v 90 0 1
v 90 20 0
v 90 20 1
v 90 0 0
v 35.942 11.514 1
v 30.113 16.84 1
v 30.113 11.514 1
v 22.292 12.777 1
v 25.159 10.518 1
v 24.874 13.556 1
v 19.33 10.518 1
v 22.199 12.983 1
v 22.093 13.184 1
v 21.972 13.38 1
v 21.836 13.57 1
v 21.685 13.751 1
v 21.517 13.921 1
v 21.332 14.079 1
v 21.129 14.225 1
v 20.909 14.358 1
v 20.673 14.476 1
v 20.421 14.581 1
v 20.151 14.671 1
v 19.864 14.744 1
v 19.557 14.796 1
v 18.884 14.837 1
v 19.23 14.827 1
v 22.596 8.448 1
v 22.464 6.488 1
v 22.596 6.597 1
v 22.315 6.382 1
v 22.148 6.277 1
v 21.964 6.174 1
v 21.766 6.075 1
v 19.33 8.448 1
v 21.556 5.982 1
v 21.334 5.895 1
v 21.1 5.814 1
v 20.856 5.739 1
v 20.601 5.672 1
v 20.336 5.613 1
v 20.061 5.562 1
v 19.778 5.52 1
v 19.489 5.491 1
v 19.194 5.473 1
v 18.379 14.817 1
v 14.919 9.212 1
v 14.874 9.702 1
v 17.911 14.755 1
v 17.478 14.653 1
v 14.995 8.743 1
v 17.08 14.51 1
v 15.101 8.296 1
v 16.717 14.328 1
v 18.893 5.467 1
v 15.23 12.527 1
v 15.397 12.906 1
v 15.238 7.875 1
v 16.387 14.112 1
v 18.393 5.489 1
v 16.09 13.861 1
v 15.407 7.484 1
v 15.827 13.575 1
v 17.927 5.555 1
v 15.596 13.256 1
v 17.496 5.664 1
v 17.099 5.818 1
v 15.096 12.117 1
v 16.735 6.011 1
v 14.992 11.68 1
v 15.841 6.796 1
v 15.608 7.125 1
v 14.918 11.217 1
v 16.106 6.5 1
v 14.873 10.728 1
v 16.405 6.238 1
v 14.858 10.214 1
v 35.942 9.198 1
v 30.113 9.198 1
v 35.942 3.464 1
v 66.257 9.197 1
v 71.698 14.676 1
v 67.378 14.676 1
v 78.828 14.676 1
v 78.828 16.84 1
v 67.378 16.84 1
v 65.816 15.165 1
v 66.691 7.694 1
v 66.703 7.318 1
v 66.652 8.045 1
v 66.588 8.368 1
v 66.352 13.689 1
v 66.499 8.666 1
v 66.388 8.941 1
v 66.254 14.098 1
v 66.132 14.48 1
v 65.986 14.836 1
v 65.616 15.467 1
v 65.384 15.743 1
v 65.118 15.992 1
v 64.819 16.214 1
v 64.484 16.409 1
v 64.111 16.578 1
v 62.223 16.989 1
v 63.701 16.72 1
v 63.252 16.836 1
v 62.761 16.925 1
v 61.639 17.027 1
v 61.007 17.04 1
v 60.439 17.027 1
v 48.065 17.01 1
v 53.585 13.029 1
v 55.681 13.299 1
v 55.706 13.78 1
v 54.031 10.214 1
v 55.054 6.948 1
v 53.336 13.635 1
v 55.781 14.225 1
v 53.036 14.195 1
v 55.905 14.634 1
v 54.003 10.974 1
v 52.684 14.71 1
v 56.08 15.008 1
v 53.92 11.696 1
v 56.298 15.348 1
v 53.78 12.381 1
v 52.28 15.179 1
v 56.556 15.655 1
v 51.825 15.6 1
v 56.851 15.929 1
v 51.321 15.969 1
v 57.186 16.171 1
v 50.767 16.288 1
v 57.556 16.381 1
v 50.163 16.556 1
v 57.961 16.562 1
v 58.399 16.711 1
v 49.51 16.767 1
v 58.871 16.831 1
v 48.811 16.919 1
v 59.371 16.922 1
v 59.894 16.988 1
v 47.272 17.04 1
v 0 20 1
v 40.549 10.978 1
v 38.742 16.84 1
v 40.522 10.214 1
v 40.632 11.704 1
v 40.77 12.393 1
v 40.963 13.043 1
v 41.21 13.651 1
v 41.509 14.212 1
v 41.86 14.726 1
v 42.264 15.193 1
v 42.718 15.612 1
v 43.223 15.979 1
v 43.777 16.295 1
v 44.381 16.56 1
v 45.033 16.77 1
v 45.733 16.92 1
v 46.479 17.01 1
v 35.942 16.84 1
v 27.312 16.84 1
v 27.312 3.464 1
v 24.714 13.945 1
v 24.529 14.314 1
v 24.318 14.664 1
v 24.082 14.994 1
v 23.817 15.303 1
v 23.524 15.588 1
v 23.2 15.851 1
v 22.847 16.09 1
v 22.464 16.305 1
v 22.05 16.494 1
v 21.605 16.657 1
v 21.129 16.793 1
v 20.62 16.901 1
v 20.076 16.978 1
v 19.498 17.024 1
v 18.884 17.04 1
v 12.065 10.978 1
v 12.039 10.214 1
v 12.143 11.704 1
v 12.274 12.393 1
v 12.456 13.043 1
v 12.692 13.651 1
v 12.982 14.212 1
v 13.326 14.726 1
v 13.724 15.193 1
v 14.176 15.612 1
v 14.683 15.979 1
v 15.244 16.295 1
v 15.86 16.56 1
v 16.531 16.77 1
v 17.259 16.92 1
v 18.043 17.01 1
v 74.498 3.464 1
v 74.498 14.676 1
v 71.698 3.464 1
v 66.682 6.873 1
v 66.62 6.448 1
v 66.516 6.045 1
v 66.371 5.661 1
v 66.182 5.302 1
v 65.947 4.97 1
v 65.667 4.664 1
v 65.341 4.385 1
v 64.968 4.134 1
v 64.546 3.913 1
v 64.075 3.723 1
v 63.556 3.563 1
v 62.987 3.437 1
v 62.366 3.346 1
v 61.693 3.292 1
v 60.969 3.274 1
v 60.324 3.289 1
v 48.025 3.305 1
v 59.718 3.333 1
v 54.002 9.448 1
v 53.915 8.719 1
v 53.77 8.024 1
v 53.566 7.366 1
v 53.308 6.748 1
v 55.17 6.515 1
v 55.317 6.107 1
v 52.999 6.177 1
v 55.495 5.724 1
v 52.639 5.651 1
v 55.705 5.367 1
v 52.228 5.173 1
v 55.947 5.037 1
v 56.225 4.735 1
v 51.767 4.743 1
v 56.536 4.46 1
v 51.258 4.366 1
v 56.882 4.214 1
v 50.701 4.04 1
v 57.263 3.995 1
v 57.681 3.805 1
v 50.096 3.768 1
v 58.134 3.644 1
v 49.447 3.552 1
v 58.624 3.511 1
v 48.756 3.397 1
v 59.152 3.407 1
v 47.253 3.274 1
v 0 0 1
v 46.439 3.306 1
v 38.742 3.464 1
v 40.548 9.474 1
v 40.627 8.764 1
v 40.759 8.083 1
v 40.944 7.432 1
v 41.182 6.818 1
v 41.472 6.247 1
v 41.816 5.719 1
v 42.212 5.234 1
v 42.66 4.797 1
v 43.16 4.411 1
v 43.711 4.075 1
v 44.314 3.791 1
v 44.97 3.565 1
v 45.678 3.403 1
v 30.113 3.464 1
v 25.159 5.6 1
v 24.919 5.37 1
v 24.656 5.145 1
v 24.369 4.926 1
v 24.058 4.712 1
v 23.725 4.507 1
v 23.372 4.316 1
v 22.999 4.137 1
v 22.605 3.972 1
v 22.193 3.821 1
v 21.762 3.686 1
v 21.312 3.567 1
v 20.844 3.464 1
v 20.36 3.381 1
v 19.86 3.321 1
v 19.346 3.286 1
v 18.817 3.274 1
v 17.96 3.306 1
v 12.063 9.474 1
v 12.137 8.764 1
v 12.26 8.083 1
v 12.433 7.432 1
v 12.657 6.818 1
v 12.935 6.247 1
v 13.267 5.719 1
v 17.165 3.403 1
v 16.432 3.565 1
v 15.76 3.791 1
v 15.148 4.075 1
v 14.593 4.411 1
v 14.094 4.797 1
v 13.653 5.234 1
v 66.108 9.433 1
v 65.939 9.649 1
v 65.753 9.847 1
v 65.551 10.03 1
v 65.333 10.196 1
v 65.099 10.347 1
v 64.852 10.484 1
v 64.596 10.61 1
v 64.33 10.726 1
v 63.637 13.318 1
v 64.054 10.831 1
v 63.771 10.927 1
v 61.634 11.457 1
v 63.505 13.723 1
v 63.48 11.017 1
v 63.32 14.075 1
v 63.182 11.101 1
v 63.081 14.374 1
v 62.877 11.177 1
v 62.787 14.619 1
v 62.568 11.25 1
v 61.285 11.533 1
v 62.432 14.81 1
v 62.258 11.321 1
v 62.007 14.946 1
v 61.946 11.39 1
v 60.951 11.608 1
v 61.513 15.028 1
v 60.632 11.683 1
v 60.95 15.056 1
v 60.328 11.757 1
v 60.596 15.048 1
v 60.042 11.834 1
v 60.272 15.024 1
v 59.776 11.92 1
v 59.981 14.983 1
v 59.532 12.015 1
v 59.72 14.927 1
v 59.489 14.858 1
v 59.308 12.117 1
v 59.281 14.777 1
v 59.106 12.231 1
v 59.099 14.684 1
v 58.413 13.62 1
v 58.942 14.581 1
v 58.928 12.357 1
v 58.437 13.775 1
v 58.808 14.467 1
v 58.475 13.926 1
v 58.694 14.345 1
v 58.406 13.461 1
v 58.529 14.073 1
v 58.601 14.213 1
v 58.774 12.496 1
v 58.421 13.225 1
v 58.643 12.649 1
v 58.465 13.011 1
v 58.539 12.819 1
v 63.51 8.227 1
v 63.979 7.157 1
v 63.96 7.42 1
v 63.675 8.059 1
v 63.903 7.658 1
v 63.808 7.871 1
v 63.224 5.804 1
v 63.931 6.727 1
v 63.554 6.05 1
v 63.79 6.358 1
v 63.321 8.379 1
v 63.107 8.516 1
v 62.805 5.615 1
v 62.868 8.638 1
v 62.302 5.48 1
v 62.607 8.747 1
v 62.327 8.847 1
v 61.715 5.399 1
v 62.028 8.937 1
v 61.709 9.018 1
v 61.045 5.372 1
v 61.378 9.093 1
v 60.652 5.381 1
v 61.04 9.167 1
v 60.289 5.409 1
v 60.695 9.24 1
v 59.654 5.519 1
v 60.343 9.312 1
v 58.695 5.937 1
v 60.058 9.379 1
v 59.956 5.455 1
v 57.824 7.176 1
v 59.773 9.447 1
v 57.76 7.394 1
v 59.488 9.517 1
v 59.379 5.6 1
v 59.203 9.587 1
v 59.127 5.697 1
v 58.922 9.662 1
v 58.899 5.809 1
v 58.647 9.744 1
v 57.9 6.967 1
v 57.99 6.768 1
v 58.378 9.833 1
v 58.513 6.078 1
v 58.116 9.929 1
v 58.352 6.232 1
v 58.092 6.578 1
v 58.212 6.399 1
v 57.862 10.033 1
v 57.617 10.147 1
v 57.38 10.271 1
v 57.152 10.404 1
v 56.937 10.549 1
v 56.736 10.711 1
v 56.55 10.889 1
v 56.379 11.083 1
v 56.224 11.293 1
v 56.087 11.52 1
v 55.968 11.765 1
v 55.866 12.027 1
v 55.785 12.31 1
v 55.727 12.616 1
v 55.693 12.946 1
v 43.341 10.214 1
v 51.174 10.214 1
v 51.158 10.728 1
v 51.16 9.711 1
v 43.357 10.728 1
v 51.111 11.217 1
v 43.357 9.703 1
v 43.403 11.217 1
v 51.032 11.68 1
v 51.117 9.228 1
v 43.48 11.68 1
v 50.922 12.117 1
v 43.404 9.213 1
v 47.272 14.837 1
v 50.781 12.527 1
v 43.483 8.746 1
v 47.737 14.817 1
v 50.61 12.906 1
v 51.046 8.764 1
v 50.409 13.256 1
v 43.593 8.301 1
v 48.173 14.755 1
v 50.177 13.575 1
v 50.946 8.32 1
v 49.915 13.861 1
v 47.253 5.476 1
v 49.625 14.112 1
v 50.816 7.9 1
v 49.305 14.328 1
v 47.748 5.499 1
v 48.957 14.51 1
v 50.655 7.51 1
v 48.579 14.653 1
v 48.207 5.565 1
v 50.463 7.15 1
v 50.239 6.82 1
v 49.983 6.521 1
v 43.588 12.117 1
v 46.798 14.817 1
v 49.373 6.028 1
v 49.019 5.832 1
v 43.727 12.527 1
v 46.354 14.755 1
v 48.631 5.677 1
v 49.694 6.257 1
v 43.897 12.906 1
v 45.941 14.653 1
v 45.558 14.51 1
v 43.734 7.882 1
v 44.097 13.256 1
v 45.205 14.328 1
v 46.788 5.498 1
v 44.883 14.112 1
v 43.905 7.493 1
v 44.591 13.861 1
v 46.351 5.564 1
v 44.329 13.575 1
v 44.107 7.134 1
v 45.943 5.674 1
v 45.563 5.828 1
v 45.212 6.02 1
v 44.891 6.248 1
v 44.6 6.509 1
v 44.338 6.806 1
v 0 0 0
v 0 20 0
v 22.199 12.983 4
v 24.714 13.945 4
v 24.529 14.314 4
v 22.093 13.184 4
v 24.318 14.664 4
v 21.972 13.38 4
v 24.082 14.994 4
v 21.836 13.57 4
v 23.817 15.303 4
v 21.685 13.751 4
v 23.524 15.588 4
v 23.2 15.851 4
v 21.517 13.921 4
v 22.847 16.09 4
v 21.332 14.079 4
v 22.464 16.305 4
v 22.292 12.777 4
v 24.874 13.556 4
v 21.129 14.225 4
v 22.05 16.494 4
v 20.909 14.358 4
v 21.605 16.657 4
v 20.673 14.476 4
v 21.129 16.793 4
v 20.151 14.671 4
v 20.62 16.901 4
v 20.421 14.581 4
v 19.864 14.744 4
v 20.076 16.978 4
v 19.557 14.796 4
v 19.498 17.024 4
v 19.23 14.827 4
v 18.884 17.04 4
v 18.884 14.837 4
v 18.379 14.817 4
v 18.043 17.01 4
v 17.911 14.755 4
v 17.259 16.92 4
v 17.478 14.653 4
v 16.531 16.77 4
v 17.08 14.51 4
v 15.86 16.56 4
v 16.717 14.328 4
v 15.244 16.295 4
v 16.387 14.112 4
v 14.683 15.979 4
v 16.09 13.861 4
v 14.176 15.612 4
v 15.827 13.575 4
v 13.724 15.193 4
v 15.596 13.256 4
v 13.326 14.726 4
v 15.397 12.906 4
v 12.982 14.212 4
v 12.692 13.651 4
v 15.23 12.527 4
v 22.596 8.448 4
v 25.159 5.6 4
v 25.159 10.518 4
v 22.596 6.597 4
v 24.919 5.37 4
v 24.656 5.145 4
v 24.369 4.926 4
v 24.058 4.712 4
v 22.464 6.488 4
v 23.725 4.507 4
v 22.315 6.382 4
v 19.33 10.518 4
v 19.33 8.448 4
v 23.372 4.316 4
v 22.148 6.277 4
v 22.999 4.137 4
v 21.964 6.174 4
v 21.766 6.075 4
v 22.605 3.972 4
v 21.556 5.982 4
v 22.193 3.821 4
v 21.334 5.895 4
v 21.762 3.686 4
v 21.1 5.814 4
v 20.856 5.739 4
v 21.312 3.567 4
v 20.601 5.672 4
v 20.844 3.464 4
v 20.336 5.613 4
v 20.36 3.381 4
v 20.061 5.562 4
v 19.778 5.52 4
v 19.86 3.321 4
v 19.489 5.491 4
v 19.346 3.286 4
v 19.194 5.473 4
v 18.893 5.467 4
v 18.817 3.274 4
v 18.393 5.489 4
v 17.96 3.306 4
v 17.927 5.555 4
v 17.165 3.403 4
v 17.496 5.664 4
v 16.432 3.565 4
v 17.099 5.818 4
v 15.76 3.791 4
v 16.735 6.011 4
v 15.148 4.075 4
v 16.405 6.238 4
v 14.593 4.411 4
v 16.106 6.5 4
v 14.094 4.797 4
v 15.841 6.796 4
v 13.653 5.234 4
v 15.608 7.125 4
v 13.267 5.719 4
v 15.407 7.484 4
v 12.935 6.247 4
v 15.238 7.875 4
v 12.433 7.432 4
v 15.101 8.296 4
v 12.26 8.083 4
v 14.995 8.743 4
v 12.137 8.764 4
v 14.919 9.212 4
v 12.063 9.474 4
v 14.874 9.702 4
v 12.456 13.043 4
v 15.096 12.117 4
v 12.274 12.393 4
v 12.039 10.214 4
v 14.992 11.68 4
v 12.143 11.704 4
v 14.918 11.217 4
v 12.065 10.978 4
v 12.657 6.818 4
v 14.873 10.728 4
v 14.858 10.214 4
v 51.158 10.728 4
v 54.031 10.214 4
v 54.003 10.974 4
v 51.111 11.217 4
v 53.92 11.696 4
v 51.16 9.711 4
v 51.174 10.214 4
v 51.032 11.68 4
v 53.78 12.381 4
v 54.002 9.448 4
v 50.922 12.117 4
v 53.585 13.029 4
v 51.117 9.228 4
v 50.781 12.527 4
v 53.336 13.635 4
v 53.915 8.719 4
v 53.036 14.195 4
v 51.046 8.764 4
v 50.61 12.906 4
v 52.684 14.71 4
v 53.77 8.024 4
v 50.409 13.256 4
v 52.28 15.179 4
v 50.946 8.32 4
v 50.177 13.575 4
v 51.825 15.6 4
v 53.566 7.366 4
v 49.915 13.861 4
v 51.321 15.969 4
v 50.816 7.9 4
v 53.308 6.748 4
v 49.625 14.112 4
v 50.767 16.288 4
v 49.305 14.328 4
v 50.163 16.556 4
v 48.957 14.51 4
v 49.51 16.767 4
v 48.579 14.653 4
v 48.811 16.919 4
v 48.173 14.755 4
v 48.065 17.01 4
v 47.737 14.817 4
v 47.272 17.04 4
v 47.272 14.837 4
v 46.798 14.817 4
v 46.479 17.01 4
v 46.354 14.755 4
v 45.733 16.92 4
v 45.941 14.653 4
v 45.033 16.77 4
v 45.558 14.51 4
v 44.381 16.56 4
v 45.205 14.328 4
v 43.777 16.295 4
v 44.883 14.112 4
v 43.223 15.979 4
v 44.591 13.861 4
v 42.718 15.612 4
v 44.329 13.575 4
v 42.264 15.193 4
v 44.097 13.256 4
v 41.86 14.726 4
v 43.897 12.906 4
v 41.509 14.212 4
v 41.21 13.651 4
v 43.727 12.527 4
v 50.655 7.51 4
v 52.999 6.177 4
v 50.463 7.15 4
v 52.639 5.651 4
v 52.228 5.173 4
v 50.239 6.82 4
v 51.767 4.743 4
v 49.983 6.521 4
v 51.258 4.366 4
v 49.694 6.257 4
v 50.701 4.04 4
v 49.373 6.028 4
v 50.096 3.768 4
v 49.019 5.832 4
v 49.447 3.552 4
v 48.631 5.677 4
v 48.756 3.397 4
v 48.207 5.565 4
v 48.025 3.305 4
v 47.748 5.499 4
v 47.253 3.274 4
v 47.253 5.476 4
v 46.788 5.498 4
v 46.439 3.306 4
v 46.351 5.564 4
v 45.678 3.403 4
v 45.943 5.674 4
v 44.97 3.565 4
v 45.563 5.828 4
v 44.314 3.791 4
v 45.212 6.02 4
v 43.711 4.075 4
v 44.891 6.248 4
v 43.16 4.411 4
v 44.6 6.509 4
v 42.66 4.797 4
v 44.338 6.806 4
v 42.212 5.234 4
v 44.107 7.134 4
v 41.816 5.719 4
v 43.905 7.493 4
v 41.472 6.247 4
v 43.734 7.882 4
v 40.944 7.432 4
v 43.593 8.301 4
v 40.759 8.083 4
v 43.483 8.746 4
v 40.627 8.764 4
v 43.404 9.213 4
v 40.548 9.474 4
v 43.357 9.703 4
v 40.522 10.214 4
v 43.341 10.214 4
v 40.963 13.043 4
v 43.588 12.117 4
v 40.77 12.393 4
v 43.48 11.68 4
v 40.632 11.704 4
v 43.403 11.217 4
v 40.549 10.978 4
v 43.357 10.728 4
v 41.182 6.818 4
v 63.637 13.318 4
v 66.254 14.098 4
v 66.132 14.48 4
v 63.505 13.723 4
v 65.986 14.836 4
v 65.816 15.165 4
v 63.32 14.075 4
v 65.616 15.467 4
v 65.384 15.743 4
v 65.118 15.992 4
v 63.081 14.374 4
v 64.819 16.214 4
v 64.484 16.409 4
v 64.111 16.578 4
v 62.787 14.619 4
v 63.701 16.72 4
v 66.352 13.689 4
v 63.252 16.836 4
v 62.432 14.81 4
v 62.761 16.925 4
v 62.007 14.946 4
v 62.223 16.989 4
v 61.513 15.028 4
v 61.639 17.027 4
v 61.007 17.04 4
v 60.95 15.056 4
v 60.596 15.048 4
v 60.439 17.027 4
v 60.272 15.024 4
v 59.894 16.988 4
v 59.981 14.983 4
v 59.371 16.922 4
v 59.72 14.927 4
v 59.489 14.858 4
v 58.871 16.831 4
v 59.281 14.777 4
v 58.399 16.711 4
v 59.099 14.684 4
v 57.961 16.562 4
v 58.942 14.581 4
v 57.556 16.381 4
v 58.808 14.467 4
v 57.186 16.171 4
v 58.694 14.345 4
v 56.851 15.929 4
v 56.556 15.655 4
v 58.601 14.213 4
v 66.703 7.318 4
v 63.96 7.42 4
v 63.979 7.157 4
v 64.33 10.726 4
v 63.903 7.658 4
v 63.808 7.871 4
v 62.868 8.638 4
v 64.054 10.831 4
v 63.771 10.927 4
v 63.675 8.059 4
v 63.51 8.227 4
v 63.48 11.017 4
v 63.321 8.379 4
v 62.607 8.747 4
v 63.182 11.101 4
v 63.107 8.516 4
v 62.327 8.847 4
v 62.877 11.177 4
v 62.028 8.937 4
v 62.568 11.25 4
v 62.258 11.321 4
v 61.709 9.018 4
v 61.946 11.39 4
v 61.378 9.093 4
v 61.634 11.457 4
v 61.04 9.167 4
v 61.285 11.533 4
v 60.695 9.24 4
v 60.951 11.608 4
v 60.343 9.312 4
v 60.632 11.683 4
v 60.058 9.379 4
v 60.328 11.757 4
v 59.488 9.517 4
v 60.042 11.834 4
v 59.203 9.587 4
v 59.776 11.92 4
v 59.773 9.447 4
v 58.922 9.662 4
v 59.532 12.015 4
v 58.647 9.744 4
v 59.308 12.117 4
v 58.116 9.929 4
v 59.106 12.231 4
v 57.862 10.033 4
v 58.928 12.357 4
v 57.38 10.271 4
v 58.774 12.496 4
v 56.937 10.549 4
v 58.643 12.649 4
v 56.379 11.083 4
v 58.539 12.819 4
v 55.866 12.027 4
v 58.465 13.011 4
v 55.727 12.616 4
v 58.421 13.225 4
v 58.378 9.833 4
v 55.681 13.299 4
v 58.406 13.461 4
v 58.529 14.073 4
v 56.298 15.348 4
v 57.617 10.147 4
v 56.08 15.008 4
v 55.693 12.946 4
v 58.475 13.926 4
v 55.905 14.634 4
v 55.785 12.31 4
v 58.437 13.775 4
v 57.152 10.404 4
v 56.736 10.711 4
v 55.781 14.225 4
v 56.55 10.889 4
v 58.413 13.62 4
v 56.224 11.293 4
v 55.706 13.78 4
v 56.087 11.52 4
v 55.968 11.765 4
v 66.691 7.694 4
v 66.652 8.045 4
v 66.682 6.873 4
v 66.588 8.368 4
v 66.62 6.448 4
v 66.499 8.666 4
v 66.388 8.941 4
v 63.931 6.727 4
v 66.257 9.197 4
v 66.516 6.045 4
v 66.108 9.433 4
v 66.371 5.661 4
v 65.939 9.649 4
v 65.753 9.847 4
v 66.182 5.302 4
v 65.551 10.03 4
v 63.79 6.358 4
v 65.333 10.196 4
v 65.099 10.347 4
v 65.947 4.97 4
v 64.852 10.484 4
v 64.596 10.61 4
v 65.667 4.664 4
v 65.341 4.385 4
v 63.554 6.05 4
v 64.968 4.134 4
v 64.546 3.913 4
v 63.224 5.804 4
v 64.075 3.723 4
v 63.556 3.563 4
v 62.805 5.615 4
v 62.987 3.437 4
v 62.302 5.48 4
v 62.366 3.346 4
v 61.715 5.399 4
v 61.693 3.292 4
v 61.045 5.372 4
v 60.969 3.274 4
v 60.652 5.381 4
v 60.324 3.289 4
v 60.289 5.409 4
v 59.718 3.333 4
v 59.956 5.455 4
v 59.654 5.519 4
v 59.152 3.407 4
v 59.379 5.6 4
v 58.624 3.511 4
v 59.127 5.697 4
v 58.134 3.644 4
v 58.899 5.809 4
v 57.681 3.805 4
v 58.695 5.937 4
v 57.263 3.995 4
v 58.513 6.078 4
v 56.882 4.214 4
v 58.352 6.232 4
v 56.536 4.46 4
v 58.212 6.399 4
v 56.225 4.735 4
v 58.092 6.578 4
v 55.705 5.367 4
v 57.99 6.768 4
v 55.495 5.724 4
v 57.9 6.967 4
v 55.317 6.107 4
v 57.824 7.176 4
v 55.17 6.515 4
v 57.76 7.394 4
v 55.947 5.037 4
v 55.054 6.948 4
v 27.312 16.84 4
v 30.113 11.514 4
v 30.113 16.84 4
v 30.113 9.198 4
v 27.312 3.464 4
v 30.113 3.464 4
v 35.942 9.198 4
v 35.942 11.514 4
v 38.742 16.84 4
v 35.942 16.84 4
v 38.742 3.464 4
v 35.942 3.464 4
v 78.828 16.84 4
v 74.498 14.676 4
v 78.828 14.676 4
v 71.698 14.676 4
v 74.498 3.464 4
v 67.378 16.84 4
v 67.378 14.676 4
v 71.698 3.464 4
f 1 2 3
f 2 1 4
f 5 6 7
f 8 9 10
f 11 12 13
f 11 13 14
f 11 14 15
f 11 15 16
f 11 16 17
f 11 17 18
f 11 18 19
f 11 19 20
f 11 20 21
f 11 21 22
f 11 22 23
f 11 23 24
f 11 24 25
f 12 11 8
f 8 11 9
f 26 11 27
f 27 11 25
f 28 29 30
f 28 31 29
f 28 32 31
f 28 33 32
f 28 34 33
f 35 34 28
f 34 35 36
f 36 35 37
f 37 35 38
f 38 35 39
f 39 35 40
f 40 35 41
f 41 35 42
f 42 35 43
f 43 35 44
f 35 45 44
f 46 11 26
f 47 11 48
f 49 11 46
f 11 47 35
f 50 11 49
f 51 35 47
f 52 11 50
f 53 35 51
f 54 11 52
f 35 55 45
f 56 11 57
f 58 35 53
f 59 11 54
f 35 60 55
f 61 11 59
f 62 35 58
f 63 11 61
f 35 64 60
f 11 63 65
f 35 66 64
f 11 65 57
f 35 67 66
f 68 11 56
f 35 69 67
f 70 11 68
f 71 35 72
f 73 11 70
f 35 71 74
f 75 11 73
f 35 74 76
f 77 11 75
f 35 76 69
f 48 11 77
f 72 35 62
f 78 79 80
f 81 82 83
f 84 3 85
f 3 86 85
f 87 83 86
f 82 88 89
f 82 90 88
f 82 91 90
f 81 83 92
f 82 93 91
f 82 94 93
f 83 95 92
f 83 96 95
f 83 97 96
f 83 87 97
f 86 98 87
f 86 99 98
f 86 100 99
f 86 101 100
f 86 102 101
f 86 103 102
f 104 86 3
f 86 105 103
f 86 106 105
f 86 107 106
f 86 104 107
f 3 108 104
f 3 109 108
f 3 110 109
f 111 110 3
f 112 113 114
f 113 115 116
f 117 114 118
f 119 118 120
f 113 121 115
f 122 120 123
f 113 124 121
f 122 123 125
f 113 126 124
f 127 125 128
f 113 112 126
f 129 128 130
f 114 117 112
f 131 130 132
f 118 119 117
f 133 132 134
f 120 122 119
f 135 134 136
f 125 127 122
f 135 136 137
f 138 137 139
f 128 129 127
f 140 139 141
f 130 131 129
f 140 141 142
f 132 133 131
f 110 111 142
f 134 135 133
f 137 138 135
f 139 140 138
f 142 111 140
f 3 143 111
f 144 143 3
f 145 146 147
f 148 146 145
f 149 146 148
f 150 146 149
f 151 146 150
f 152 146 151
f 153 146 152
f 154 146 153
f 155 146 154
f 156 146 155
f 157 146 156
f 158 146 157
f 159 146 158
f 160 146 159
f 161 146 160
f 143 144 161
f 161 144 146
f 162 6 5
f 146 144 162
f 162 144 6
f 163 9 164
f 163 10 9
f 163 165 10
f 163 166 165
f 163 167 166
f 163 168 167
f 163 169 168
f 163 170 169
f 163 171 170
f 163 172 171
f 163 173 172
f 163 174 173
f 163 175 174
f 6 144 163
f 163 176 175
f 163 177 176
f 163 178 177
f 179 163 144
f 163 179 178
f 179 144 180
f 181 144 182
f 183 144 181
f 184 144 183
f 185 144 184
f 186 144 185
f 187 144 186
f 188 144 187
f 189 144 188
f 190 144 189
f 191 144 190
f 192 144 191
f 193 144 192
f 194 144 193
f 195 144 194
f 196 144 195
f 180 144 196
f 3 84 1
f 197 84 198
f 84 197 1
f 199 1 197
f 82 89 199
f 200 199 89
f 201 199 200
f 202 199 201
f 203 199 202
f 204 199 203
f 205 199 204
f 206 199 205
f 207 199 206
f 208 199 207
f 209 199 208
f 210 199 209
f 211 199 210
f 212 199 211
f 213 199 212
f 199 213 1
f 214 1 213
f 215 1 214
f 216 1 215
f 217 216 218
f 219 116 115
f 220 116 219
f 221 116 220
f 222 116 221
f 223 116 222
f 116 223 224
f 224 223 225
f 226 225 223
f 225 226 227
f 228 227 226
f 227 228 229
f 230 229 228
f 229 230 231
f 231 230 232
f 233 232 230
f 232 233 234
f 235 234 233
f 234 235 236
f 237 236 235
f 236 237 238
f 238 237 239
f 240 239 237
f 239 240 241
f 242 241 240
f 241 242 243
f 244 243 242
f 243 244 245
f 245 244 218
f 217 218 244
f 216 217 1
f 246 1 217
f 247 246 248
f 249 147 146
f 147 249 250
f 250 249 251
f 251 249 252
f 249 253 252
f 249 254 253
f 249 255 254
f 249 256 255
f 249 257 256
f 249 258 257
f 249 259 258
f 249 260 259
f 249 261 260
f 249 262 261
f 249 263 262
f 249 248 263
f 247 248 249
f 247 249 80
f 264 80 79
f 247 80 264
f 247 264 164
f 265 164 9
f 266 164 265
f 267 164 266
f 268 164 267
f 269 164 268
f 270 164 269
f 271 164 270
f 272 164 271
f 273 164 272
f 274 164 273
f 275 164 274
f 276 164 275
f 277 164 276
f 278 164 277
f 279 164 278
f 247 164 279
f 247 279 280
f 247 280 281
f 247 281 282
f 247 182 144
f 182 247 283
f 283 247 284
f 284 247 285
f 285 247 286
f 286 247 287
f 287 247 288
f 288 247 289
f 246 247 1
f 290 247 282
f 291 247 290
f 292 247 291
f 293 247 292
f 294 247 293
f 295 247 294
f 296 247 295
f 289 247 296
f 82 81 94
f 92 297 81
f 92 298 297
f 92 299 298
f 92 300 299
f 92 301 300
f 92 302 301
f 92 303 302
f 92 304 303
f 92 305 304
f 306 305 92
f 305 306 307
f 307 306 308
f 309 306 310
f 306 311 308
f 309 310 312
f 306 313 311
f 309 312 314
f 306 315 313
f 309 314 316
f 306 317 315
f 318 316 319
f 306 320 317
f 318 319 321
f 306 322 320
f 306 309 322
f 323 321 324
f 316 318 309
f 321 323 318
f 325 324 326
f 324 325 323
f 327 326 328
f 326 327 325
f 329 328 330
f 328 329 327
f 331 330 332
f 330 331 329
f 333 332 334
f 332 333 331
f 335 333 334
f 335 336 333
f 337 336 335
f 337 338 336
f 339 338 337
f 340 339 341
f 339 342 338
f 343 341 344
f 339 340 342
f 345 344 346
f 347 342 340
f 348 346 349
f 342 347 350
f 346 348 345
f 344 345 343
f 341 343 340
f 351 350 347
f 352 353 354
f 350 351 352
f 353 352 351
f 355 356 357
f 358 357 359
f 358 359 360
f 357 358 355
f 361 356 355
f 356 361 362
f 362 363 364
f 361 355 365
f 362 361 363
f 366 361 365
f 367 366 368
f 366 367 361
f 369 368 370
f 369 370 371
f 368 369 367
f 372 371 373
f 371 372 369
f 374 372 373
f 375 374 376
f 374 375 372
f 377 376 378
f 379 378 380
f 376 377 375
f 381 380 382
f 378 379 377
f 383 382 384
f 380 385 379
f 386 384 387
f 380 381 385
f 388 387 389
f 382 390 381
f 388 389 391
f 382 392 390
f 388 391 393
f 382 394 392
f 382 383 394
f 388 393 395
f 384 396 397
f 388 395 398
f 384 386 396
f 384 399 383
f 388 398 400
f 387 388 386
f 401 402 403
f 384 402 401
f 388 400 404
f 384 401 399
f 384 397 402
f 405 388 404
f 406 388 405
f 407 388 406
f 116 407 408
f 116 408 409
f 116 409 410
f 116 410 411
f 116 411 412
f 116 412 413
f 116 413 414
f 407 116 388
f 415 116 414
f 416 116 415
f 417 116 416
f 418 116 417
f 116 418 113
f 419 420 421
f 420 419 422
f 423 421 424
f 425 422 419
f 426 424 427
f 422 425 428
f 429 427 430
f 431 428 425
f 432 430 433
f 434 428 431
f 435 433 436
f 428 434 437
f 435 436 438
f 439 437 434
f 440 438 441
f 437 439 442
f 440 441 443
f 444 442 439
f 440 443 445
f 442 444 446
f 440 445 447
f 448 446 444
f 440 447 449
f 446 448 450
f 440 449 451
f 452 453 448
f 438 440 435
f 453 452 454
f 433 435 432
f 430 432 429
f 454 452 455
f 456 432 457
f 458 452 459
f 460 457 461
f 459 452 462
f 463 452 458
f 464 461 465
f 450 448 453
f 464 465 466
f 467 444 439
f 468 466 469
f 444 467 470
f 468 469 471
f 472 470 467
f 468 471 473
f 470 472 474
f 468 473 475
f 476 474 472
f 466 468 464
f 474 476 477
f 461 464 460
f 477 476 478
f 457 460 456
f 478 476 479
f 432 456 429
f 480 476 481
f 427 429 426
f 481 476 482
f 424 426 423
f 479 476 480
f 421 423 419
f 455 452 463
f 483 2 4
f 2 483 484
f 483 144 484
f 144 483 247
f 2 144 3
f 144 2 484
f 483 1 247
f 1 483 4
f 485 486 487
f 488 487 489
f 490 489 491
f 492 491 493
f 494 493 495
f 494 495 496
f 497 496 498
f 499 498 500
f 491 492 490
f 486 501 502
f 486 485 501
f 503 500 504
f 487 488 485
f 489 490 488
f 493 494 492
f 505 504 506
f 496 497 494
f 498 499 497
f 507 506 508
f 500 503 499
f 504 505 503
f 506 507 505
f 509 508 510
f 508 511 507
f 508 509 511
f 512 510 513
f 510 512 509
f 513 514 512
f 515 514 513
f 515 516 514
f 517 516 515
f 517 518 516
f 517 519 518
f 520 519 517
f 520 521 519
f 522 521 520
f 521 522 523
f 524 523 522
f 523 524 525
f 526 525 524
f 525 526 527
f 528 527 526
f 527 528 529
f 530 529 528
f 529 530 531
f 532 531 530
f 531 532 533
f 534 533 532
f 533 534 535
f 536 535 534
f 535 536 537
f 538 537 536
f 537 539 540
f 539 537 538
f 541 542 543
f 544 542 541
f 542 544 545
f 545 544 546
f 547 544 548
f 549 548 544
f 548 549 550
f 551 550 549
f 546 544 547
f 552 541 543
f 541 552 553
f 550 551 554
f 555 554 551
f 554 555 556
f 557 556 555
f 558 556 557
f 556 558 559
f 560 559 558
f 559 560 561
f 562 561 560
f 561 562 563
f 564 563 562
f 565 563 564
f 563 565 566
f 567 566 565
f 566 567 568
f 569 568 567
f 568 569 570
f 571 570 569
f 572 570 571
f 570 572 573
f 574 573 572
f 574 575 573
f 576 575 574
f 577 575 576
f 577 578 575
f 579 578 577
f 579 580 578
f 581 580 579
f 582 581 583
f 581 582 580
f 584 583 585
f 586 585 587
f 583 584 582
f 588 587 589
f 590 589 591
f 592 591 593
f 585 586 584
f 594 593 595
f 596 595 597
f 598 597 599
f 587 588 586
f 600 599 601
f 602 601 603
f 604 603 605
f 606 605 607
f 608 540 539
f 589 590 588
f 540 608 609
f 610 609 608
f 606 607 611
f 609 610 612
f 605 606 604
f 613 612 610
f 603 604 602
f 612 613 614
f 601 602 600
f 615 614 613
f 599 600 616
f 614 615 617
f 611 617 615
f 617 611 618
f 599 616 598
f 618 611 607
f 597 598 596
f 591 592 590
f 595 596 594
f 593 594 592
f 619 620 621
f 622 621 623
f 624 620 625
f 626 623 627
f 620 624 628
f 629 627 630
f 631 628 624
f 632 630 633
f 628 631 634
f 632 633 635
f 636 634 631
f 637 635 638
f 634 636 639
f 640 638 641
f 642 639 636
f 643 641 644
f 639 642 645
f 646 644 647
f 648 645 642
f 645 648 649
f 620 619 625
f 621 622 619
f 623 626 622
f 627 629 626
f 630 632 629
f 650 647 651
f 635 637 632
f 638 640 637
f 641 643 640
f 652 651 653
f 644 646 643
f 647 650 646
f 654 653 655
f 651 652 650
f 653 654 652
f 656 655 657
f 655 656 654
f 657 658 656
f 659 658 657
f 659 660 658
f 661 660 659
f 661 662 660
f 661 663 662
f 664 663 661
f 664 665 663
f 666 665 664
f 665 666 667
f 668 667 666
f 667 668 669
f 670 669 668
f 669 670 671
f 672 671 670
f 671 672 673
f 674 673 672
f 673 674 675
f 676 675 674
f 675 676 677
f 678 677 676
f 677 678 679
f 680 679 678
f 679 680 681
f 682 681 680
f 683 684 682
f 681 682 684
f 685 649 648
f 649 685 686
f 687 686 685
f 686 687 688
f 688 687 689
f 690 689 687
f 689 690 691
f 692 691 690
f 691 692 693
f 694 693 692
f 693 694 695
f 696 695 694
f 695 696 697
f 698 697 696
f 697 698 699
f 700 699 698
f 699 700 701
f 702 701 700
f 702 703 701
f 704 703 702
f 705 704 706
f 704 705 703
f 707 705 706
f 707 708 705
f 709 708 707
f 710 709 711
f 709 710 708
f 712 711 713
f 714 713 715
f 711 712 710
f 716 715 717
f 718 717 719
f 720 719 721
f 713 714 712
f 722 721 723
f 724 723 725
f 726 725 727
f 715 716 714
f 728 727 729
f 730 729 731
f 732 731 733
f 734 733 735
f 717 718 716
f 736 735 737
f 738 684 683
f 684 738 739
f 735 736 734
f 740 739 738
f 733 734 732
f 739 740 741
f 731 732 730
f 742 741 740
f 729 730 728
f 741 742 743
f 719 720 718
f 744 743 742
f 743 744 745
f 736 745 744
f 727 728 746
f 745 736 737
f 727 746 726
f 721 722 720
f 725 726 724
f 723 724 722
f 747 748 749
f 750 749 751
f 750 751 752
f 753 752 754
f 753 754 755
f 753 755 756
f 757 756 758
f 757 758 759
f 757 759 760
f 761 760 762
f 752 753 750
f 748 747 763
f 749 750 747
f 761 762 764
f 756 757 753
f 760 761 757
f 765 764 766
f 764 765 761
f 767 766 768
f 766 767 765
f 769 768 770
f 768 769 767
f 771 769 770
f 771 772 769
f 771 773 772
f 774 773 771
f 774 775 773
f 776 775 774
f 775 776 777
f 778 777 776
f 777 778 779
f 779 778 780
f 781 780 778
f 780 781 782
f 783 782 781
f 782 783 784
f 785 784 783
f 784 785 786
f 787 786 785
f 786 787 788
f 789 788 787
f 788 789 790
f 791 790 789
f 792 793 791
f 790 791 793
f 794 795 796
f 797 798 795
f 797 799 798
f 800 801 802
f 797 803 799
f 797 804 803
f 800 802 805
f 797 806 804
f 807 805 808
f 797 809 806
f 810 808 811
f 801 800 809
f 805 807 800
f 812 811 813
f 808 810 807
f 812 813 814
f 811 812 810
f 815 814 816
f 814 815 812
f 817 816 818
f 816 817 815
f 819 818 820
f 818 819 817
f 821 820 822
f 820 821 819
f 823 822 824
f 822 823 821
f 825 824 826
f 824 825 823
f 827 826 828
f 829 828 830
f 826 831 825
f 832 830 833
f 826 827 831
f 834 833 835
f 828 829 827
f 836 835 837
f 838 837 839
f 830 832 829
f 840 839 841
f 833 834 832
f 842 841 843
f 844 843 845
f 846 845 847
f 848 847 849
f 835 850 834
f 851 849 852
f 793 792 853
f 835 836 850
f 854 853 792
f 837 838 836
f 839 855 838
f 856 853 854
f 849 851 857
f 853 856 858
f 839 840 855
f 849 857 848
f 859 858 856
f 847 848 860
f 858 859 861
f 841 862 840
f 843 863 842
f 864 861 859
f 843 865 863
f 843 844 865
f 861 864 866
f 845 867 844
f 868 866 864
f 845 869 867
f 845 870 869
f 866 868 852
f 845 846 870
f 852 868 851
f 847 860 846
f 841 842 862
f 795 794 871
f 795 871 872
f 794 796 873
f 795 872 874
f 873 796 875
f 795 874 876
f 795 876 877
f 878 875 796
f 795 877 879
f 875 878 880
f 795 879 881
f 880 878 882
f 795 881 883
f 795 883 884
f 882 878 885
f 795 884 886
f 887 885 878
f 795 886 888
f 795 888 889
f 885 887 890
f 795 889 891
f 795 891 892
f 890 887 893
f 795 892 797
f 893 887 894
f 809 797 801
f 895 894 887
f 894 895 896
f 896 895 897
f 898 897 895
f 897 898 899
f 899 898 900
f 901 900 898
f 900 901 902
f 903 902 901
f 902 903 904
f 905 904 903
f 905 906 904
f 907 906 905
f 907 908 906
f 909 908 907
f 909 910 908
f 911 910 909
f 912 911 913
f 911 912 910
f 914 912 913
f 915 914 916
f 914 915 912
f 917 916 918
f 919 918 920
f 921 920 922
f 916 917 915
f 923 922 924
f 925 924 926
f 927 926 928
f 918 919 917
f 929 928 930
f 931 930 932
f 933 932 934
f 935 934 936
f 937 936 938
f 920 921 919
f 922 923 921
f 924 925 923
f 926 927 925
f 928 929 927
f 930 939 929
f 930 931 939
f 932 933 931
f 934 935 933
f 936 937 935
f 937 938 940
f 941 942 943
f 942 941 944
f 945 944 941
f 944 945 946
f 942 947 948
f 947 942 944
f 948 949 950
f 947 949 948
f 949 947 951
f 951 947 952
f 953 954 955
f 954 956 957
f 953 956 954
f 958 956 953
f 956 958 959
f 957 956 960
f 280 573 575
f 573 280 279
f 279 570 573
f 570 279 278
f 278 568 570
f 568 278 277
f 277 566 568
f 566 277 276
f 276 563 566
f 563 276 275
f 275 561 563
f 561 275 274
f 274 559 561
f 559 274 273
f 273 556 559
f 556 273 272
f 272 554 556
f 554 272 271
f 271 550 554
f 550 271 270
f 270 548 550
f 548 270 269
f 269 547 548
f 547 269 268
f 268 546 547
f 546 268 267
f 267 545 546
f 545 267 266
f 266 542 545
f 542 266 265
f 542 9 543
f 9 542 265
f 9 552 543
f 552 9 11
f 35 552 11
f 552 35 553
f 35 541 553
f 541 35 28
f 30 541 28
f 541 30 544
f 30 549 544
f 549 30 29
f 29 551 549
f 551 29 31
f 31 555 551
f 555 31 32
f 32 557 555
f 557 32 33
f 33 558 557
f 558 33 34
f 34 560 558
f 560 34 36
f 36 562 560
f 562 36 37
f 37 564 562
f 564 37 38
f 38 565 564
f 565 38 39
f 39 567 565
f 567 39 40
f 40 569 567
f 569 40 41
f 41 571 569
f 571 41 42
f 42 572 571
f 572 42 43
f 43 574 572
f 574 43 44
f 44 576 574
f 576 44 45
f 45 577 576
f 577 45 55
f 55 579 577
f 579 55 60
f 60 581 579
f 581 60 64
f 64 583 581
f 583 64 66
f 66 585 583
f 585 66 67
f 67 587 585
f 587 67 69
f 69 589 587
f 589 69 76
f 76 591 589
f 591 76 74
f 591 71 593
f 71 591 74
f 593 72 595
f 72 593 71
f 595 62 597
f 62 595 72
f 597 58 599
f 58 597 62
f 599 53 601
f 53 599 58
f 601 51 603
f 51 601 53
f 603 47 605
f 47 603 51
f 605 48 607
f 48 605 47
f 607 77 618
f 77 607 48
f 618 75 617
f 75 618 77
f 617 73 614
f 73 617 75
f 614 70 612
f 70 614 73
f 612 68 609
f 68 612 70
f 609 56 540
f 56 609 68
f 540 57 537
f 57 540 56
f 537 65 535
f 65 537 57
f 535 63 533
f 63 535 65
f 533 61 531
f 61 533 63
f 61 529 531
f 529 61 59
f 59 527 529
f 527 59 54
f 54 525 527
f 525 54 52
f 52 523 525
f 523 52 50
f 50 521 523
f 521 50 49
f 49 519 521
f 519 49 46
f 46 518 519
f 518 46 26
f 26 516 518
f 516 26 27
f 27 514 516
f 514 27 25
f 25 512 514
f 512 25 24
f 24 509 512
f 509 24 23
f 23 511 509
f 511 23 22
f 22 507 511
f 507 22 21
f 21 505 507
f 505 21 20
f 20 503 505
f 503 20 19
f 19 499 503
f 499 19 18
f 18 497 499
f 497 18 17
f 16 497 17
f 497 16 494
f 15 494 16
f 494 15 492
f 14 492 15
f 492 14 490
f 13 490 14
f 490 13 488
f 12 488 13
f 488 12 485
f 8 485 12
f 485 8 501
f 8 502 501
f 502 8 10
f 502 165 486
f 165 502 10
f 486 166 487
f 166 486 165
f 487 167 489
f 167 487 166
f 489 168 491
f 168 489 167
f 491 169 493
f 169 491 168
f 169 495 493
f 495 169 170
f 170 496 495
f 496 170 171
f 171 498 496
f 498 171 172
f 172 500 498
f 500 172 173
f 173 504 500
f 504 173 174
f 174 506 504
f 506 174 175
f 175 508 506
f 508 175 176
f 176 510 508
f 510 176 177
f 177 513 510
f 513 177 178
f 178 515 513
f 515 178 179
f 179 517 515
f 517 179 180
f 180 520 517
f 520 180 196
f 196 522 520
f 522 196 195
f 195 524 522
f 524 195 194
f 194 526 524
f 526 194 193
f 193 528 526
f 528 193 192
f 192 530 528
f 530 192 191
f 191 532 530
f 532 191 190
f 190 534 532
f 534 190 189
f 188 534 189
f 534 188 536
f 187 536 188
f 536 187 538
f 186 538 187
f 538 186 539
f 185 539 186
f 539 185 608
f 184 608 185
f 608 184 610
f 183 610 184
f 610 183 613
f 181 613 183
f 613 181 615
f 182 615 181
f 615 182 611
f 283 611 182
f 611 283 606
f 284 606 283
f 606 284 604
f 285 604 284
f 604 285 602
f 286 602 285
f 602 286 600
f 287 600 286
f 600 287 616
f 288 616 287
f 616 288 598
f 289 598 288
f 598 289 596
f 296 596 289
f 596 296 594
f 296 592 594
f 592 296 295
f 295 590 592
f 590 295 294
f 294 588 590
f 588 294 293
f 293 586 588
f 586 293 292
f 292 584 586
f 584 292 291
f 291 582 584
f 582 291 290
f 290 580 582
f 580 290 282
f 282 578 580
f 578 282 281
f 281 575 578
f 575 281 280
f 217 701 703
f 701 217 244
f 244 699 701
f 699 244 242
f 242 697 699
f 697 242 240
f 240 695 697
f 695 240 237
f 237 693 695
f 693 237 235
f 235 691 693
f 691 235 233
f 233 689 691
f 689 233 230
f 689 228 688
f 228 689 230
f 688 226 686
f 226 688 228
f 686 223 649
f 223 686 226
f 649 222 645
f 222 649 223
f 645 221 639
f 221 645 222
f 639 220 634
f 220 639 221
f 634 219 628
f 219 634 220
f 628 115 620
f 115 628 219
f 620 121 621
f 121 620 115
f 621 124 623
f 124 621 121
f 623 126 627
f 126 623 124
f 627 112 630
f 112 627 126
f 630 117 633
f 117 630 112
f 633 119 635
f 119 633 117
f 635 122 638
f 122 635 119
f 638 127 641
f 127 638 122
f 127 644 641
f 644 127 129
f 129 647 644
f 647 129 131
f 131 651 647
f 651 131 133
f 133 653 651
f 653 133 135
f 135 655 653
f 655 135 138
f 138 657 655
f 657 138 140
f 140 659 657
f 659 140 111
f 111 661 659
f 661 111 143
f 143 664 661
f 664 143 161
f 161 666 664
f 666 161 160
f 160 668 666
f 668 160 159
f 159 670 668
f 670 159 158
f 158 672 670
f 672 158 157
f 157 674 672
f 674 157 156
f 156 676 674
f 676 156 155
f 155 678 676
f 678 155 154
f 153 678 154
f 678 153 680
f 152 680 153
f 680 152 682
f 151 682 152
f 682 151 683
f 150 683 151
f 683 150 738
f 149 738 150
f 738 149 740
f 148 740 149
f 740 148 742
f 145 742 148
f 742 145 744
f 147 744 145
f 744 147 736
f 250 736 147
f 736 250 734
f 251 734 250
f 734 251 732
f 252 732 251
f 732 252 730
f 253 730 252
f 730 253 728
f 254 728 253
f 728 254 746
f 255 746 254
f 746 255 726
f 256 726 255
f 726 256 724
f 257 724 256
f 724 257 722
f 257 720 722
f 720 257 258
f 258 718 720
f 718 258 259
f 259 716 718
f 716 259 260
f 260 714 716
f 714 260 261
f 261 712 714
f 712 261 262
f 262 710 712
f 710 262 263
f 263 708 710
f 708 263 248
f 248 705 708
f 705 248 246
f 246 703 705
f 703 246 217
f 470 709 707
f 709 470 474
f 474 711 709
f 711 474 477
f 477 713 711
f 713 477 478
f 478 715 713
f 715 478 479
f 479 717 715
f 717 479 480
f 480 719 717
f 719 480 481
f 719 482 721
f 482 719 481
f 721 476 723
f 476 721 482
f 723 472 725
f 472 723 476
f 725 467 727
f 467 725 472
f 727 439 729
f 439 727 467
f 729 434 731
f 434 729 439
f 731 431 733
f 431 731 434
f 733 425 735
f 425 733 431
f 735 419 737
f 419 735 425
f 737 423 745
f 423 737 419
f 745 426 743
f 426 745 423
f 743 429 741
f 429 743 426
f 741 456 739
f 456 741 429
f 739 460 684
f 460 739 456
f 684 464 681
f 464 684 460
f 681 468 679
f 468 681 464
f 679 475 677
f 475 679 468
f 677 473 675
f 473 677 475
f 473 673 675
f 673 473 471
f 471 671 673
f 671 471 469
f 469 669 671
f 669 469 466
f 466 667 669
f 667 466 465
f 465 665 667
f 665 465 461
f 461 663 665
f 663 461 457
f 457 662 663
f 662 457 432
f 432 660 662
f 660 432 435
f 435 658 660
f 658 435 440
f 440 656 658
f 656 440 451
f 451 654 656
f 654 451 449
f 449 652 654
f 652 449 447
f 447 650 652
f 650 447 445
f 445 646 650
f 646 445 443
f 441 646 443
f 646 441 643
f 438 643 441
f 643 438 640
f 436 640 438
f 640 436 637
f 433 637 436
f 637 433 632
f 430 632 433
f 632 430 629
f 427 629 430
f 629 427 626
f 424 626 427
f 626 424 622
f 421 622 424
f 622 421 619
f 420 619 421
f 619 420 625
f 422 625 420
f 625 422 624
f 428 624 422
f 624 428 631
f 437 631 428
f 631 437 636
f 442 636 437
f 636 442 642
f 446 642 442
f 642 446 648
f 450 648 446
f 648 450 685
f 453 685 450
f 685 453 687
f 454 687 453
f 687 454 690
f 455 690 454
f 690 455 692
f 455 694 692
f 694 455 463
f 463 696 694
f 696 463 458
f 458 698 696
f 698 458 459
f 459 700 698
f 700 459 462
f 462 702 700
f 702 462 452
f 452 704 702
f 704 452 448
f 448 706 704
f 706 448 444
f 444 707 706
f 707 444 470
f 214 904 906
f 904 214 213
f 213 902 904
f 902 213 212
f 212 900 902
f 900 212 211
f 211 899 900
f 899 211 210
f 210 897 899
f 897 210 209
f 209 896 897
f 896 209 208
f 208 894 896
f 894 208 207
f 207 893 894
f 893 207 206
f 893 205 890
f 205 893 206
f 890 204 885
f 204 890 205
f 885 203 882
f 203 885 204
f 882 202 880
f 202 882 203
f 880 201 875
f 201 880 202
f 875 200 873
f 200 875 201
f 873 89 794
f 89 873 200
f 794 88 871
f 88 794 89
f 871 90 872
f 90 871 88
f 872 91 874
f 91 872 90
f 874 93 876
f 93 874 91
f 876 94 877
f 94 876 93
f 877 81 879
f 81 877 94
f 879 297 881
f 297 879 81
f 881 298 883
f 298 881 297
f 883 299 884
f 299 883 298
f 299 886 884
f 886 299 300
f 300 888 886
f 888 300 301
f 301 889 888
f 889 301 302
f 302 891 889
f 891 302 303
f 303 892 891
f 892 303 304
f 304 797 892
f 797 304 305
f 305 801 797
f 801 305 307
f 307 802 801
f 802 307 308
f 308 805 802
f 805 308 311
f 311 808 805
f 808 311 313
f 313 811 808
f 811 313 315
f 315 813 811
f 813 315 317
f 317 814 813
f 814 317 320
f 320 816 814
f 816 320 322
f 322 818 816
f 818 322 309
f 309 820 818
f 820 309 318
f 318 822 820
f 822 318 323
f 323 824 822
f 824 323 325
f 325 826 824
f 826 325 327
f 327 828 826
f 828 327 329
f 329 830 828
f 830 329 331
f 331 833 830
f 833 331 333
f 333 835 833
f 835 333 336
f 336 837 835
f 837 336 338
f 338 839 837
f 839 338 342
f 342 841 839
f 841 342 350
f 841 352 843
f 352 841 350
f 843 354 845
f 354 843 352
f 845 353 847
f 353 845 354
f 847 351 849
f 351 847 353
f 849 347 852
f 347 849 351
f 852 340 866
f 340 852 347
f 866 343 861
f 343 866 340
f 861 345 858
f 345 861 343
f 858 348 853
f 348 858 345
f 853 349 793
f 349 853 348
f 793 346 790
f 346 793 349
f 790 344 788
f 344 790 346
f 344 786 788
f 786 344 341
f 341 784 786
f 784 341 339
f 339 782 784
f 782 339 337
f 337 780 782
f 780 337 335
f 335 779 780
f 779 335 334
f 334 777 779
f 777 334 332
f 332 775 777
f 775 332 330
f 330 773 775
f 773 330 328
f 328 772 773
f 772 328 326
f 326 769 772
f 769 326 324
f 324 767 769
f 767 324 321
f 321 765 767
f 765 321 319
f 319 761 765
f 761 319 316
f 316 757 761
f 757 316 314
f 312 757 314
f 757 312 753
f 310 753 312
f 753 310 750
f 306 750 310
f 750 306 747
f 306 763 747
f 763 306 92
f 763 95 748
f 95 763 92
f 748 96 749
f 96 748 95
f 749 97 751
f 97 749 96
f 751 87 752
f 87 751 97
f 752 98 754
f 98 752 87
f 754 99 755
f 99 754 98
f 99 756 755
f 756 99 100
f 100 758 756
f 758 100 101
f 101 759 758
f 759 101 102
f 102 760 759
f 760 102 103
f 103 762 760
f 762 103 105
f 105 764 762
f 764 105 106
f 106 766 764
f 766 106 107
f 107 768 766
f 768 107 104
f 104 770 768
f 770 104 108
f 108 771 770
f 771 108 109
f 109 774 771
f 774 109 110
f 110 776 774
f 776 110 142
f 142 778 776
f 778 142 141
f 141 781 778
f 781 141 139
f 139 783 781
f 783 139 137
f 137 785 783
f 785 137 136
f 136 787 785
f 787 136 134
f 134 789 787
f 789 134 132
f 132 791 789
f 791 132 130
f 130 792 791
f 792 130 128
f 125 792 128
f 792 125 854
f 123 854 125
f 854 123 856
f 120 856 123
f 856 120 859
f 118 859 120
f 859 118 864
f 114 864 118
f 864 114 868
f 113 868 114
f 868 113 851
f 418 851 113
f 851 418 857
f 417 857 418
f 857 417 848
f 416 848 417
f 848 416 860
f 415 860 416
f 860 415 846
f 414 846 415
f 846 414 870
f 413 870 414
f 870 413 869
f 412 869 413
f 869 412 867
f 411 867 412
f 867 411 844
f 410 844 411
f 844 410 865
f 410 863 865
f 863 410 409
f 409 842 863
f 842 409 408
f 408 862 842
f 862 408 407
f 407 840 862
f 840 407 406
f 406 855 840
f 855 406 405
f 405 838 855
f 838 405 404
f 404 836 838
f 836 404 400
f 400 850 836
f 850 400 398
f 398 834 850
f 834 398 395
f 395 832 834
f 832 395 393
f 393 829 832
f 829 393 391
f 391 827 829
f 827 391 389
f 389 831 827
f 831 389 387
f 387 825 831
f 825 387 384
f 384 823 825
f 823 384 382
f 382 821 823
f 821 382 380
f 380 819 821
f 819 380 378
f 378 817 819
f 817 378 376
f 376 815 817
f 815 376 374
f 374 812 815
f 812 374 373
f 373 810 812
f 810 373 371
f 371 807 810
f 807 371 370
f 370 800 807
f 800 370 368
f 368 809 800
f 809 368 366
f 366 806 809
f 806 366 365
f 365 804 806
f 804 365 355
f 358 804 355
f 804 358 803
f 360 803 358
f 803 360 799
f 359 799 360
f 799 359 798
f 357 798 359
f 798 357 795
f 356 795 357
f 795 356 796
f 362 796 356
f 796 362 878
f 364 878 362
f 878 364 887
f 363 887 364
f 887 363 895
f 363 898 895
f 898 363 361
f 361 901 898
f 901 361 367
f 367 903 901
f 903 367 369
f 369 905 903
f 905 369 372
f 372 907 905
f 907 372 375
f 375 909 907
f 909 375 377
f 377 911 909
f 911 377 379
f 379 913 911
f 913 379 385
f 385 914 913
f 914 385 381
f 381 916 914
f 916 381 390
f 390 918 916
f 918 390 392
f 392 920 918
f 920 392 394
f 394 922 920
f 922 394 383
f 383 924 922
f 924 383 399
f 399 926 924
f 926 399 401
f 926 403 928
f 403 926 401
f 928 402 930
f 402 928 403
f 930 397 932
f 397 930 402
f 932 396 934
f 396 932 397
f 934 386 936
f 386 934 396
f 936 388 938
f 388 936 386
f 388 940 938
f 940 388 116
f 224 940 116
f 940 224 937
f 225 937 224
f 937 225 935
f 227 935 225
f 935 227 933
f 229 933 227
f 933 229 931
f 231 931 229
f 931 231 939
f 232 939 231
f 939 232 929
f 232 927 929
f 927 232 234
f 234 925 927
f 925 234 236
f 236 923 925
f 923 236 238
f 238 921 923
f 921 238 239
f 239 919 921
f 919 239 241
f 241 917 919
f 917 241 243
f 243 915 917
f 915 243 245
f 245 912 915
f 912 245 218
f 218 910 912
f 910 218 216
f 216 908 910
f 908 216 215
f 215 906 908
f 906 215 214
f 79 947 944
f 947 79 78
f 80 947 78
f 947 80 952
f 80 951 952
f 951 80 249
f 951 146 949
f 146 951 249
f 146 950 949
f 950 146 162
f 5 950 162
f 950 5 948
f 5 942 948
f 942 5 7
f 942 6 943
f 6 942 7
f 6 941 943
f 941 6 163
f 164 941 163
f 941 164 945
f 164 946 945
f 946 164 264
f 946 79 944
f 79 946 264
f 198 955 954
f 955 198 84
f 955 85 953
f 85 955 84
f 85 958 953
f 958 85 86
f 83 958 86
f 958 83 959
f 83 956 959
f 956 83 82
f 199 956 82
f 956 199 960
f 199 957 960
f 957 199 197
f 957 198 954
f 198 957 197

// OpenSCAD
// GHOST text plate — place this ON TOP of TapaSumo in your slicer
// Dimensions: fits centered on a 112x112mm cover
// Height: 3mm raised text on a 1mm base plate

translate([0, 0, 0])
union() {
    // Base plate
    cube([90, 20, 1]);

    // Raised GHOST letters
    translate([45, 10, 1])
        linear_extrude(height=3)
            text("GHOST",
                 size=14,
                 font="Liberation Sans:style=Bold",
                 halign="center",
                 valign="center");
}
